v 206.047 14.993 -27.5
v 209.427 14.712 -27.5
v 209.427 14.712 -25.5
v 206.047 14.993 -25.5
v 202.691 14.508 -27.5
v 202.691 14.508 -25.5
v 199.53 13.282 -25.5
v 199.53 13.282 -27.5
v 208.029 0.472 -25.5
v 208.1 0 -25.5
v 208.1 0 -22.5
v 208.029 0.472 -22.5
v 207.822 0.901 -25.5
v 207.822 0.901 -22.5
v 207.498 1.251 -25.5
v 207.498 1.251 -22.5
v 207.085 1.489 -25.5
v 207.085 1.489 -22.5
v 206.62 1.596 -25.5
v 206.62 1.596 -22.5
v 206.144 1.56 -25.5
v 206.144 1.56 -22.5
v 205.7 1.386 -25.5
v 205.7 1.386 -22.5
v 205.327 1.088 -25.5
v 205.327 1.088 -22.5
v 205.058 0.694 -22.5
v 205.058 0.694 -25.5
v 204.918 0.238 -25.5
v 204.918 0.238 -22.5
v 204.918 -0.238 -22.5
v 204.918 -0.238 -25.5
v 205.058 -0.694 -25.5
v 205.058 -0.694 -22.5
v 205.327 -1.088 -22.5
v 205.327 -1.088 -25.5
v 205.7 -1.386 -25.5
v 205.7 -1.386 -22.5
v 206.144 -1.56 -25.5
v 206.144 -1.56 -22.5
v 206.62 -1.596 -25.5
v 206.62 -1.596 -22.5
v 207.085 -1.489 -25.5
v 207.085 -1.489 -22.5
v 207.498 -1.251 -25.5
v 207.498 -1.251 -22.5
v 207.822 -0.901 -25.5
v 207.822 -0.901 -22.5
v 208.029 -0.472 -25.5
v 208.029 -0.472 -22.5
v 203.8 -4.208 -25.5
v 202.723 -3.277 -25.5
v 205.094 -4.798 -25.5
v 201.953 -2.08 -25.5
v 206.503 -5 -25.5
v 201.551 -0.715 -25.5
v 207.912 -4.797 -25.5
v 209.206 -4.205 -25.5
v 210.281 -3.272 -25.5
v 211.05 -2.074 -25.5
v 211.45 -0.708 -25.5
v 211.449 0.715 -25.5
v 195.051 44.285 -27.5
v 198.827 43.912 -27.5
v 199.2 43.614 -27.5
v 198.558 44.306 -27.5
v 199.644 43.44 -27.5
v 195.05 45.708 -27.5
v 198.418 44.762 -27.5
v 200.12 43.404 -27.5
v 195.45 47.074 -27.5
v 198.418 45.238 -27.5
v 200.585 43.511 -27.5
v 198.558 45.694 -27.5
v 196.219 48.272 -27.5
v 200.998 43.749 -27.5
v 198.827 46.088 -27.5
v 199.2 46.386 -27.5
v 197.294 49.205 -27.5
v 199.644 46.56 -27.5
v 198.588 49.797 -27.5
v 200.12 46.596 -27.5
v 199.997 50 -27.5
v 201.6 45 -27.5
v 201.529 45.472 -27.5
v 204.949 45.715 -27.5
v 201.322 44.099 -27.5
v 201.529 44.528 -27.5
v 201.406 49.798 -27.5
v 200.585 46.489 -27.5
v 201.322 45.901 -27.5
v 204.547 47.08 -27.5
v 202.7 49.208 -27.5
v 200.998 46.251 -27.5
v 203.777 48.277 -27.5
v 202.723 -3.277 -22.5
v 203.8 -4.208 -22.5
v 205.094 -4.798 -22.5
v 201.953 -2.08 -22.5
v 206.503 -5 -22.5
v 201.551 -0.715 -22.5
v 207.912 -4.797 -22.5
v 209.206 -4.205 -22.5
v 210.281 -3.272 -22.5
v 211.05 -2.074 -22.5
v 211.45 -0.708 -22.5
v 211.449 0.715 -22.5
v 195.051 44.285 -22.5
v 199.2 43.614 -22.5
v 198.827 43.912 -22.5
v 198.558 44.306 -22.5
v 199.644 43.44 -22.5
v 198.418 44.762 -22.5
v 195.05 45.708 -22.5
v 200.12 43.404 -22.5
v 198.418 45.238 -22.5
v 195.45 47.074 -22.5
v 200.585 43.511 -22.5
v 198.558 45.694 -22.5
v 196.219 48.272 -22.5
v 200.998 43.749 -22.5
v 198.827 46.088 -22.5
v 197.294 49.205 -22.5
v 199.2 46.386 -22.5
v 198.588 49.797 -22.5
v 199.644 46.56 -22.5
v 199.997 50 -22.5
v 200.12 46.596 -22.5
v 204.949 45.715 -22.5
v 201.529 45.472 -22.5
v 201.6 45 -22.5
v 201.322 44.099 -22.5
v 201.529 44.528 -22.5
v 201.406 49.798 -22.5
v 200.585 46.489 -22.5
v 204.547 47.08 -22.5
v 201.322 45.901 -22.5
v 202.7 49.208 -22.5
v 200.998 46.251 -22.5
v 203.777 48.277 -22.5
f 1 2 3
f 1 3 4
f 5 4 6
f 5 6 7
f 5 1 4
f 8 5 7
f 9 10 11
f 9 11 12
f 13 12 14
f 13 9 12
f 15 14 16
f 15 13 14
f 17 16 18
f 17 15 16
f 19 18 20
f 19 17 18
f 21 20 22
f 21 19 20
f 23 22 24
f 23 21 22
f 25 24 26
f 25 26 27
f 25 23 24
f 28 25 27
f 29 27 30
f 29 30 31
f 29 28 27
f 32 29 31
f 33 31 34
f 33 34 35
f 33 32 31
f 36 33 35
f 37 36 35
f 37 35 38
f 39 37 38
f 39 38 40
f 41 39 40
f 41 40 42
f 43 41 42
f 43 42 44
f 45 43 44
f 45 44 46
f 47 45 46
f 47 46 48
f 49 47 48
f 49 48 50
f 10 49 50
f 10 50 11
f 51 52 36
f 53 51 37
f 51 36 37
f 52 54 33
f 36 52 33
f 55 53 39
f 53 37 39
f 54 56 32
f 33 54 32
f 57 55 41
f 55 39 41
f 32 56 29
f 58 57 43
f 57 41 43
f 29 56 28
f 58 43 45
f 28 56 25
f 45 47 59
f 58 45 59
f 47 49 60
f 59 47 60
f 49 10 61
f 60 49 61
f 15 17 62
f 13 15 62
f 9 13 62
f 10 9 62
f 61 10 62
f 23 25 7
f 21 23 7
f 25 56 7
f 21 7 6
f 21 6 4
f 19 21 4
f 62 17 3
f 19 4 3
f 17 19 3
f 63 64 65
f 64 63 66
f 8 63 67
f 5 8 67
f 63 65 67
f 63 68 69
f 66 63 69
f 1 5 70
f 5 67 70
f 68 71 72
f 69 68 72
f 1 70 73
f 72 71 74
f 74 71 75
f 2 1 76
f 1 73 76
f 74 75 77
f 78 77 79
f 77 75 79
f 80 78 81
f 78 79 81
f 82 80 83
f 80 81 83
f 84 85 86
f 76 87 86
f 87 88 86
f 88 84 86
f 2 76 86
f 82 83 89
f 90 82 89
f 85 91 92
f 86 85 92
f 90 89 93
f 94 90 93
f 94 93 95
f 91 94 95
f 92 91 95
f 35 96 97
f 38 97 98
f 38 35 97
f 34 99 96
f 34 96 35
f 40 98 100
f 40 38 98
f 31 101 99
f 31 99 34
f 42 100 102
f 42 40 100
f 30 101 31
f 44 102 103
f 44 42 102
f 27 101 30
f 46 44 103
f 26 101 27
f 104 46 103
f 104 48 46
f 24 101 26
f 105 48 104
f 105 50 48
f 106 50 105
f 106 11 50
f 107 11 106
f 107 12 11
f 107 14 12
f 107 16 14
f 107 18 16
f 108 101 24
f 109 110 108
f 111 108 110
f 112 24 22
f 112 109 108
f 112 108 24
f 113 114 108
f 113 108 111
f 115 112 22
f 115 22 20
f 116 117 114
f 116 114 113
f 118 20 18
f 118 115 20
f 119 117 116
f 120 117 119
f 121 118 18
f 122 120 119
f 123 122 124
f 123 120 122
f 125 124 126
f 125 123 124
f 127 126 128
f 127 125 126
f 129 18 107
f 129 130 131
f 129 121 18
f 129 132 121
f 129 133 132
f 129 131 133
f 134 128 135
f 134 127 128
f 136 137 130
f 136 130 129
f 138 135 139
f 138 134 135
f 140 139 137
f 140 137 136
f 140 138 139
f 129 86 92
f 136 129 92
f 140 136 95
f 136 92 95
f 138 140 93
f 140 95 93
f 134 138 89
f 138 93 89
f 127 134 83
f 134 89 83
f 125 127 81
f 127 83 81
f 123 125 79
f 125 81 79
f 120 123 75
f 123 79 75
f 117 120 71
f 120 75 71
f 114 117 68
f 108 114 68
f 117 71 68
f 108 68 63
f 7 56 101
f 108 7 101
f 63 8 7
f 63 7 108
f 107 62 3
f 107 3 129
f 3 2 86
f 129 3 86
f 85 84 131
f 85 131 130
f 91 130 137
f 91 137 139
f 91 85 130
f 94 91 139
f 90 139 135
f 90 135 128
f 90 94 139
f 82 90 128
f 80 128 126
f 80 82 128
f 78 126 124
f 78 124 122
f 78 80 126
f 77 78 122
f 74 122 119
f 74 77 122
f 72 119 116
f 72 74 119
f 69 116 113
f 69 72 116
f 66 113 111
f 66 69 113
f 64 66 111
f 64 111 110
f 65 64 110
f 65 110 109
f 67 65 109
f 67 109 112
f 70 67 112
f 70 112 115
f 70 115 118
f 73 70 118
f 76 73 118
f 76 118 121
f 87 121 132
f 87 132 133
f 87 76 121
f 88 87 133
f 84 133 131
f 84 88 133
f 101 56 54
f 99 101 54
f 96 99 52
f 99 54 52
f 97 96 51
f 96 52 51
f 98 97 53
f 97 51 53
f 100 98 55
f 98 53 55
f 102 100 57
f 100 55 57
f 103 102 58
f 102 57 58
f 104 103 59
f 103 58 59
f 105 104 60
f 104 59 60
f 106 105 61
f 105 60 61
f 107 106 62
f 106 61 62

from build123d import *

# Parameters (mm, degrees)
CYLINDER011_R     = 15
CYLINDER011_DEPTH = 2
SKETCH009_R       = 1.6
PAD012_DEPTH      = 5


with BuildPart() as cilindro011:
    # Cylinder011 → Cylinder011 (new body)
    with BuildSketch(Plane(origin=(206.5, 0, -27.5), x_dir=(1, 0, 0), z_dir=(0, 0, 1))):
        Circle(CYLINDER011_R)
    extrude(amount=CYLINDER011_DEPTH)


with BuildPart() as cut007:
    # Sketch009 → Pad012 (new body)
    with BuildSketch(Plane.XY.offset(-27.5)):
        with BuildLine():
            ThreePointArc((201.551358, -0.714804), (207.214804, -4.948642), (211.448642, 0.714804))
            Line((211.448642, 0.714804), (204.948642, 45.714804))
            ThreePointArc((204.948642, 45.714804), (199.285196, 49.948642), (195.051358, 44.285196))
            Line((201.551358, -0.714804), (195.051358, 44.285196))
        make_face()
        with Locations((200, 45)):
            Circle(SKETCH009_R, mode=Mode.SUBTRACT)
        with Locations((206.5, 0)):
            Circle(SKETCH009_R, mode=Mode.SUBTRACT)
    extrude(amount=PAD012_DEPTH)

    # Cut007: cut Cilindro011
    add(cilindro011.part, mode=Mode.SUBTRACT)


solid = cut007.part
